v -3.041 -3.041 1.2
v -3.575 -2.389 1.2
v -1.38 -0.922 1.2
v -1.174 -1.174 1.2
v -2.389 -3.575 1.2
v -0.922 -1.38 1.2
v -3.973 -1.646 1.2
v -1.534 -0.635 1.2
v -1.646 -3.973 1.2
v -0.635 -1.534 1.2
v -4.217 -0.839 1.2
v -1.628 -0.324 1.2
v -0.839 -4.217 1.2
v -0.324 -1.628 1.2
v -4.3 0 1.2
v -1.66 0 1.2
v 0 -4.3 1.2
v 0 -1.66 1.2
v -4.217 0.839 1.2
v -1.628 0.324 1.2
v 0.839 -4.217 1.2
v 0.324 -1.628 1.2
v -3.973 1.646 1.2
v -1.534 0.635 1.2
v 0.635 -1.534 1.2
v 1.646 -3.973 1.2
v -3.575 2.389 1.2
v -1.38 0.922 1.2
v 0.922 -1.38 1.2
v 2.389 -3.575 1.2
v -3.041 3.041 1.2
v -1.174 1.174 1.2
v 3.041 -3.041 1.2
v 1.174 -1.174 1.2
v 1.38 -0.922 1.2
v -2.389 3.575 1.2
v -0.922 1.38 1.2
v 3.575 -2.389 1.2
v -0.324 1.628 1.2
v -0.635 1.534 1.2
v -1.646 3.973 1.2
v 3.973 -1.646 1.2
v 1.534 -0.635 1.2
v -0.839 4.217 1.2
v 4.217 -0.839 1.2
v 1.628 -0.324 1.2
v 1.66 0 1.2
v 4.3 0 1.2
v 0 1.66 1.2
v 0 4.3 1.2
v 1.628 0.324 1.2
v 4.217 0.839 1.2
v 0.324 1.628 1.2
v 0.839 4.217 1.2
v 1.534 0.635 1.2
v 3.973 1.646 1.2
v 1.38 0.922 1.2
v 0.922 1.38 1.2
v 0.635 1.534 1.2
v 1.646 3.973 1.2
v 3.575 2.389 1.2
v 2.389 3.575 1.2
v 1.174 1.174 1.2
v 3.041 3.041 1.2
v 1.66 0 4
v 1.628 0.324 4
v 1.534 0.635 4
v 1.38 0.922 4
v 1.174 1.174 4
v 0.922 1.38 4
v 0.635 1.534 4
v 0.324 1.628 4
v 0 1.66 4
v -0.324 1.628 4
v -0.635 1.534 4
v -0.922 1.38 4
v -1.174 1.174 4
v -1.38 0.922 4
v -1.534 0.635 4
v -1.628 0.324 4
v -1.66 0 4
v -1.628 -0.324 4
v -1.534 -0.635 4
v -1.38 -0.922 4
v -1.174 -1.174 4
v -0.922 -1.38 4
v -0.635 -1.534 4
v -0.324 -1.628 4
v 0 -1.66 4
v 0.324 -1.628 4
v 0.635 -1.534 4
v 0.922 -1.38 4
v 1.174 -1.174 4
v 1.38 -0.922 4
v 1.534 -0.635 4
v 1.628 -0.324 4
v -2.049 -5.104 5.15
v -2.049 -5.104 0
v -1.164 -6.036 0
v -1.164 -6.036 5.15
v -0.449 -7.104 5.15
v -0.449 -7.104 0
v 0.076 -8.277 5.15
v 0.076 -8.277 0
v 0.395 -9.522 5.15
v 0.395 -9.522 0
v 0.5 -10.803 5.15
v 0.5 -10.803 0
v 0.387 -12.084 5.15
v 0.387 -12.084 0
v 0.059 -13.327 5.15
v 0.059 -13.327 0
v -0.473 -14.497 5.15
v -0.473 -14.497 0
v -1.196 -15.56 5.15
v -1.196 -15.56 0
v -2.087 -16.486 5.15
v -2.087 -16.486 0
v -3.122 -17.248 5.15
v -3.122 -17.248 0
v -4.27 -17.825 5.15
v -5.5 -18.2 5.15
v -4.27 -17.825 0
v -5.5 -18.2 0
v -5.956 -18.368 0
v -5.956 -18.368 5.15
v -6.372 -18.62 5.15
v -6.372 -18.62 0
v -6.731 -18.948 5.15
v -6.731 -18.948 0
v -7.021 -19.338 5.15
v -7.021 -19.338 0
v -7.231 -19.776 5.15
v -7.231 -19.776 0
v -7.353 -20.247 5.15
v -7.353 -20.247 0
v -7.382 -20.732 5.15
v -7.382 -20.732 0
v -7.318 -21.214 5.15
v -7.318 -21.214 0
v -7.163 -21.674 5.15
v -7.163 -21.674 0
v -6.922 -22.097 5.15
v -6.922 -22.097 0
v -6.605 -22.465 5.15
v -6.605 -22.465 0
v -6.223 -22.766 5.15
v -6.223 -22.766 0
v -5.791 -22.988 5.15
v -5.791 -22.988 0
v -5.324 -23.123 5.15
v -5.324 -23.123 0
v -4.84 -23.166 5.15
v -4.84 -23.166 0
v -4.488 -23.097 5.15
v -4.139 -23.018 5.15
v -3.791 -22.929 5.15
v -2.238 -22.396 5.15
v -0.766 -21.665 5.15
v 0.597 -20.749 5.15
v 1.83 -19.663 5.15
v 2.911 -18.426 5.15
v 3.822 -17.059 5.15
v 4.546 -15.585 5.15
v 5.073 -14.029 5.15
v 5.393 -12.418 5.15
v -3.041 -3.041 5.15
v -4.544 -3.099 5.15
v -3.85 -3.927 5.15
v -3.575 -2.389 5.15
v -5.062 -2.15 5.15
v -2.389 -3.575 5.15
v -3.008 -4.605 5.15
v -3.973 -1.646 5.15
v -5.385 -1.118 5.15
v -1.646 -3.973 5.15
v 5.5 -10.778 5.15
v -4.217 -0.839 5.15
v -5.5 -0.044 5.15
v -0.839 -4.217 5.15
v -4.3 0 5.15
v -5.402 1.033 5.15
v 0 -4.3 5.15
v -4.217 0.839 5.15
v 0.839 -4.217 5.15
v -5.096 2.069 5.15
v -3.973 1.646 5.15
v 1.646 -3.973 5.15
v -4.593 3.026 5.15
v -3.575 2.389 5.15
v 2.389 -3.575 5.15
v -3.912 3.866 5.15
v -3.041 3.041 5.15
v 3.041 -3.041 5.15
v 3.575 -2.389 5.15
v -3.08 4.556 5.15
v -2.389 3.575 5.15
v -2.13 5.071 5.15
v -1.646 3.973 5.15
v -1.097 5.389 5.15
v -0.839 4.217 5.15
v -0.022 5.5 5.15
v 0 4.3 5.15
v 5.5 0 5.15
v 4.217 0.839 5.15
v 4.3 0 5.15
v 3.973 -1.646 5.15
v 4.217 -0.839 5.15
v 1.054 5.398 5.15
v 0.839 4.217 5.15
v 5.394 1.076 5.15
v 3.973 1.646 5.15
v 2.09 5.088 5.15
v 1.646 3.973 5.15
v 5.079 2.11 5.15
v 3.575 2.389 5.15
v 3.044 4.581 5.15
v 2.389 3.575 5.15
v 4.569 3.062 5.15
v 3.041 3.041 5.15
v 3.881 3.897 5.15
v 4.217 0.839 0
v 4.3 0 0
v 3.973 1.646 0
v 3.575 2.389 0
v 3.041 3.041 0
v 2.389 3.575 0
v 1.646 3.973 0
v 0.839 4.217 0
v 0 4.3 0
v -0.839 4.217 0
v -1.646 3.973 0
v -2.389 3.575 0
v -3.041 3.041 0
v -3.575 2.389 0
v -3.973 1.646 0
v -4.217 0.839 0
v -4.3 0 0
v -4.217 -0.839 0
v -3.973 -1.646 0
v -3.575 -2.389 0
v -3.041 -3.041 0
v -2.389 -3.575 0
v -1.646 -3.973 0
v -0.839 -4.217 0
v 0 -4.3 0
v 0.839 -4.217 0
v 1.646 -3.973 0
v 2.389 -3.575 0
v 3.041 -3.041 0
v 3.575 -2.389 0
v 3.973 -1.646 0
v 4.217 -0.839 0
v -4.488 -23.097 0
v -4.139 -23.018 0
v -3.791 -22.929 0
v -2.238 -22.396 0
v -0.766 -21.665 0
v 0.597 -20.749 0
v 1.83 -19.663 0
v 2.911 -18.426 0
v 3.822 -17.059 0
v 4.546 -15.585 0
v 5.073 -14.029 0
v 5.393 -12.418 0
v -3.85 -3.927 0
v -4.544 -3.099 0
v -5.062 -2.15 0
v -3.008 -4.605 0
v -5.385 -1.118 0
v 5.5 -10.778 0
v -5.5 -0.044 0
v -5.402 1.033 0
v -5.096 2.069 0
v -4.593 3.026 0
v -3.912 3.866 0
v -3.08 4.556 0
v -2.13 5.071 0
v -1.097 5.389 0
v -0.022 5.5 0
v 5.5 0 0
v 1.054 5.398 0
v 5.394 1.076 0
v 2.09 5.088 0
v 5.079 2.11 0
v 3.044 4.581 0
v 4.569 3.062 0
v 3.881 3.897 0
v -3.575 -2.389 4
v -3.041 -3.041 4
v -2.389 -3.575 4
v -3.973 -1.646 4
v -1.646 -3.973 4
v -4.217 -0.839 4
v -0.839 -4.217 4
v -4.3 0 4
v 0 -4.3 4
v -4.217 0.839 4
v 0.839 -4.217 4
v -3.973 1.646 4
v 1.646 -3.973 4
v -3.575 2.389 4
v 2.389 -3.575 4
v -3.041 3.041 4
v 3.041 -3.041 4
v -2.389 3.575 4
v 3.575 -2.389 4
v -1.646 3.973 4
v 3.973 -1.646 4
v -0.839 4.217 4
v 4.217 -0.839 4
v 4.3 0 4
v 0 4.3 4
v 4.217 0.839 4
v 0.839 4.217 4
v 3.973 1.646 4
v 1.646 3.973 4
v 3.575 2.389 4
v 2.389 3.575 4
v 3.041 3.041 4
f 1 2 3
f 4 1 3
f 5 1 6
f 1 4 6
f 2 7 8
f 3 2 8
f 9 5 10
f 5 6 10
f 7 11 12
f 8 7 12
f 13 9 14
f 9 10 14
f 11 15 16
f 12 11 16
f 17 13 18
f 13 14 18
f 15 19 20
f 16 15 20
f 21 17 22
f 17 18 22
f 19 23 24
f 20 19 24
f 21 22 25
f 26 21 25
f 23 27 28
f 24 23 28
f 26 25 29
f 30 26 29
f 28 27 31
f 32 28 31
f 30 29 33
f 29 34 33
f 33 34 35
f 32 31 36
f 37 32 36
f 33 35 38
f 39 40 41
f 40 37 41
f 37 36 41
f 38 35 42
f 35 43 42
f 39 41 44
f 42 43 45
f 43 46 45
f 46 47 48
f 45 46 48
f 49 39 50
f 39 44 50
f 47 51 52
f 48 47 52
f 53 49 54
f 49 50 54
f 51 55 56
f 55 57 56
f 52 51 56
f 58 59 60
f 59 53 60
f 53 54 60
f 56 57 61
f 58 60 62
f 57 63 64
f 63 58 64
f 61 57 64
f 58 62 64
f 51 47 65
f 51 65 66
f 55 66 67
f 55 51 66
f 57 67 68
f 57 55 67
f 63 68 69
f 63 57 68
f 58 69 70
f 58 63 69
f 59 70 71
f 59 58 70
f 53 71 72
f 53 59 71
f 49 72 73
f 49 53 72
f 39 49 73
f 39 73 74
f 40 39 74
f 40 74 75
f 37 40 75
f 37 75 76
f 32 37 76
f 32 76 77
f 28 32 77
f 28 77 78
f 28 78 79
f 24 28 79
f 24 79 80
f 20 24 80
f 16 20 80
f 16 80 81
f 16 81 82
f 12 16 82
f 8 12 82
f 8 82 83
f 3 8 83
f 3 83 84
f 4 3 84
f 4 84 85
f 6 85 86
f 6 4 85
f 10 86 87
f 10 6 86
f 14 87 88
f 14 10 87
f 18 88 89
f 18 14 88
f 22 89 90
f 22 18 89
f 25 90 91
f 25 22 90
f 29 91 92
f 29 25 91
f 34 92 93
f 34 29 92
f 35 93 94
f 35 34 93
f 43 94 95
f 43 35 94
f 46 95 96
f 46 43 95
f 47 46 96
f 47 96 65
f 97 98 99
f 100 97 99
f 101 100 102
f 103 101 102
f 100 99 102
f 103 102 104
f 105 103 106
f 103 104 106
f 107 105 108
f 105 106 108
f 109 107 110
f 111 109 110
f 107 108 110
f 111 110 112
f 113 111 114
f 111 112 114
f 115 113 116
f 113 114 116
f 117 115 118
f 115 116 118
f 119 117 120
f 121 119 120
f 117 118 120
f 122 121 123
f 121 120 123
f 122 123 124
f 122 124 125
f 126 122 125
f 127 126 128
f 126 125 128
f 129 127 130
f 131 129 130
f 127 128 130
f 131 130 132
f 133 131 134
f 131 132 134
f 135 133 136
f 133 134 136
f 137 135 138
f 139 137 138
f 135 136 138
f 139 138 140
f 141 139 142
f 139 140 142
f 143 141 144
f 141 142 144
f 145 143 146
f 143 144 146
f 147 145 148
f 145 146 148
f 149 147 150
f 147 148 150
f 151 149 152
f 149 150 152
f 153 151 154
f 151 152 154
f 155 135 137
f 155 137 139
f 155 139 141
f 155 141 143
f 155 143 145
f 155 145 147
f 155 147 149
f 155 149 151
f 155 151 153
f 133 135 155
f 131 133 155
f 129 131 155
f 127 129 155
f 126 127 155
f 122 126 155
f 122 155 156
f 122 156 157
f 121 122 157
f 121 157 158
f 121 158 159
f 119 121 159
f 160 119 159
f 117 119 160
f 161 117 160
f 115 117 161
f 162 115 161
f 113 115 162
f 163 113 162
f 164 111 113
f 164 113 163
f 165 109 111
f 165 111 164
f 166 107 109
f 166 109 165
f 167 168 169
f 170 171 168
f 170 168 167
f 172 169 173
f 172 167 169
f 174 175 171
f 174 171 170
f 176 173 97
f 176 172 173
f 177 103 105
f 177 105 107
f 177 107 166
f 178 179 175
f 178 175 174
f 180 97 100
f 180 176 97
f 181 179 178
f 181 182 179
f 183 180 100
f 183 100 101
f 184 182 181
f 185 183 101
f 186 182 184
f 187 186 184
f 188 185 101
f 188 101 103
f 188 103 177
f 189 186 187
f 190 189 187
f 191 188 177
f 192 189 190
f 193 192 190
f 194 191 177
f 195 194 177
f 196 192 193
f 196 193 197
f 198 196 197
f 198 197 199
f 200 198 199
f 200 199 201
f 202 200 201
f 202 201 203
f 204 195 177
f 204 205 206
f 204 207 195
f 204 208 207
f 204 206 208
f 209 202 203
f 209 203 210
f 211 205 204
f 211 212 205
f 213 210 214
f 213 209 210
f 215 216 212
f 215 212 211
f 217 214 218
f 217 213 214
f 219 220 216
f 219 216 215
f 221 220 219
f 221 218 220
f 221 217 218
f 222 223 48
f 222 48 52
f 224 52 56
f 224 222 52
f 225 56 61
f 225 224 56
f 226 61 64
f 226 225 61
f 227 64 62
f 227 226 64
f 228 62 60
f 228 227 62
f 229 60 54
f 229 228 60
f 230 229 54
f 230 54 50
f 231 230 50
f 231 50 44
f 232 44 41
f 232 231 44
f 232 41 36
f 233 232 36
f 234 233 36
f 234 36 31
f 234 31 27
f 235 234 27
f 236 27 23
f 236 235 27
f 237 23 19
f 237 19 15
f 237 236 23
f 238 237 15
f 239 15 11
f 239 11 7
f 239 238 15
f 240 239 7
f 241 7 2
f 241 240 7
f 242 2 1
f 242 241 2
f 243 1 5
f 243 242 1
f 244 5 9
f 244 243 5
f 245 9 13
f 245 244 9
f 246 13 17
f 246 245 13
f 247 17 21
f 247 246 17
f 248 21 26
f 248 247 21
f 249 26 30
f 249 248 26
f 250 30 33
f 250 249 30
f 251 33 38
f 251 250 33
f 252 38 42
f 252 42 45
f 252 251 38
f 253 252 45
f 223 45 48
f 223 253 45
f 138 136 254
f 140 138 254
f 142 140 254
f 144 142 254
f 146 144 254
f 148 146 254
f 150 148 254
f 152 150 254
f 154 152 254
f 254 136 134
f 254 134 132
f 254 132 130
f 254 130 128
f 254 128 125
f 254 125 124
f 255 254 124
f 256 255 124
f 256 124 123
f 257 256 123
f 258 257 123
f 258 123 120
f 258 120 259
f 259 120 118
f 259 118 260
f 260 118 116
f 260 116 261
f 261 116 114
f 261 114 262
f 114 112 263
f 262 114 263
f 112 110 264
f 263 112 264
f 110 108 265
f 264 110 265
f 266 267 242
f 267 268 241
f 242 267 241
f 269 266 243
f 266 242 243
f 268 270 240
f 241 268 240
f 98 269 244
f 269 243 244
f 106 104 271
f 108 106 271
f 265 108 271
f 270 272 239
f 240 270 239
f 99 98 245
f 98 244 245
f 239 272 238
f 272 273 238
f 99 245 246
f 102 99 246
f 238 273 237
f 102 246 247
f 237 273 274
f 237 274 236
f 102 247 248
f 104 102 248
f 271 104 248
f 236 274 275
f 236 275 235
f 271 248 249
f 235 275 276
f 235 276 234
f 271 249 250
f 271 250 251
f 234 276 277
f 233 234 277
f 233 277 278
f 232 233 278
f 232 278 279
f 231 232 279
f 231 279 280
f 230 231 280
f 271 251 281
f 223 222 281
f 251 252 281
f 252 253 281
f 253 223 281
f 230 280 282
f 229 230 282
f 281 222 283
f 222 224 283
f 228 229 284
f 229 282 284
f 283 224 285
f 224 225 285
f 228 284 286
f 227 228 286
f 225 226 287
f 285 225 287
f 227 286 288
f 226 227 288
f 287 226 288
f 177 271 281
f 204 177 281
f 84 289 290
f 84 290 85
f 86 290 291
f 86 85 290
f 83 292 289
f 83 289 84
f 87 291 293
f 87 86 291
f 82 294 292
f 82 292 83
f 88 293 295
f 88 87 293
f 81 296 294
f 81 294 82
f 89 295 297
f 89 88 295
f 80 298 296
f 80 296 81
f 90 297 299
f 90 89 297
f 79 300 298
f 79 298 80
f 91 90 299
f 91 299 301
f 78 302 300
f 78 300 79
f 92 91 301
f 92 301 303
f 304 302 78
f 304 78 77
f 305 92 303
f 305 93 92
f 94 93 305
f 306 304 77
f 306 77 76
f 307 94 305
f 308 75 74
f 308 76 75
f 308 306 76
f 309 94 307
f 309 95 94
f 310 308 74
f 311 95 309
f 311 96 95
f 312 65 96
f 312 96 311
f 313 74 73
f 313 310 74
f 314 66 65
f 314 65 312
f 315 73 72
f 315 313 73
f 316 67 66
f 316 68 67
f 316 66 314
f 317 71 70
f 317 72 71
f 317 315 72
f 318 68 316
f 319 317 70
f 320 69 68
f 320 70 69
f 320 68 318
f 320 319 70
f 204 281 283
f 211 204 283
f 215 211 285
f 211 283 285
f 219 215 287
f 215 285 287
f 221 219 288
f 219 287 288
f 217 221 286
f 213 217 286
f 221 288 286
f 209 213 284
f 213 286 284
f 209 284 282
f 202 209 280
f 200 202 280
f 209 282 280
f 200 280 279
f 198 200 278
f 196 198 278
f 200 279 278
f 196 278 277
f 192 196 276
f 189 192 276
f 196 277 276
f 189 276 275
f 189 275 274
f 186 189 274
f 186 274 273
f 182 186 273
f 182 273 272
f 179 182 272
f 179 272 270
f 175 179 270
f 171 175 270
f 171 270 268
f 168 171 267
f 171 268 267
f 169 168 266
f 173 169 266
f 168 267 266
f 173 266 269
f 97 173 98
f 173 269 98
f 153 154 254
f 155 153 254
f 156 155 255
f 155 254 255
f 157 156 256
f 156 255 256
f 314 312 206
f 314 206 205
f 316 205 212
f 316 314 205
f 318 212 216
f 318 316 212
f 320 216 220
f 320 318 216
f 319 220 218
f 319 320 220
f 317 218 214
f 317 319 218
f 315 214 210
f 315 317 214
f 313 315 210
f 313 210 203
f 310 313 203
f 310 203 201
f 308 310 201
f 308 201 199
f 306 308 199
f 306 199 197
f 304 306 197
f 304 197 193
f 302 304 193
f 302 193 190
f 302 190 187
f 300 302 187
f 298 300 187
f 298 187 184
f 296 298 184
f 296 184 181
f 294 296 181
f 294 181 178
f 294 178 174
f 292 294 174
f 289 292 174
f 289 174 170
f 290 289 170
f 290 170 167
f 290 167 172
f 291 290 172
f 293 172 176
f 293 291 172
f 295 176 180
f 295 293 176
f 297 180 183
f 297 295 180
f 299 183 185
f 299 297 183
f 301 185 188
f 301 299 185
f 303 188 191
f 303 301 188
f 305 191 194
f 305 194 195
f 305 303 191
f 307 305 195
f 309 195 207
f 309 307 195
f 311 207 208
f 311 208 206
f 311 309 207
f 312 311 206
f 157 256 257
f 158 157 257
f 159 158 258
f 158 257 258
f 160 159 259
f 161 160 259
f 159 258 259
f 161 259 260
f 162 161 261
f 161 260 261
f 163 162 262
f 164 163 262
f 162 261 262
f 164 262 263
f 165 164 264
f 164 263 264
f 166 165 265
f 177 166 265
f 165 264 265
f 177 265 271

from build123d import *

# Parameters (mm, degrees)
F0_R     = 4.3
F1_DEPTH = 5.15
F0_R_2   = 1.66
F2_DEPTH = 4
F3_DEPTH = 1.2


with BuildPart() as f1:
    # F0 (on Top) → F1 (new body)
    with BuildSketch(Plane.XY):
        with BuildLine():
            Line((5.5, -10.778409), (5.5, 0))
            ThreePointArc((5.5, 0), (3.080493, -4.556376), (-2.049295, -5.103958))
            ThreePointArc((-2.049295, -5.103958), (0.249491, -12.712308), (-5.5, -18.2))
            ThreePointArc((-5.5, -18.2), (-7.361798, -20.974231), (-4.839874, -23.165703))
            ThreePointArc((-4.839874, -23.165703), (-4.313128, -23.058356), (-3.791444, -22.928621))
            ThreePointArc((-3.791444, -22.928621), (2.910923, -18.426262), (5.5, -10.778409))
        make_face()
        with BuildLine():
            ThreePointArc((-2.049295, -5.103958), (3.080493, -4.556376), (5.5, 0))
            ThreePointArc((5.5, 0), (-3.080493, 4.556376), (-2.049295, -5.103958))
        make_face()
        Circle(F0_R, mode=Mode.SUBTRACT)
    extrude(amount=F1_DEPTH)

    # F0 (on Top) → F2 (join)
    with BuildSketch(Plane.XY):
        Circle(F0_R)
        Circle(F0_R_2, mode=Mode.SUBTRACT)
    extrude(amount=F2_DEPTH)

    # F0 (on Top) → F3 (cut)
    with BuildSketch(Plane.XY):
        Circle(F0_R)
        Circle(F0_R_2, mode=Mode.SUBTRACT)
    extrude(amount=F3_DEPTH, mode=Mode.SUBTRACT)


solid = f1.part
